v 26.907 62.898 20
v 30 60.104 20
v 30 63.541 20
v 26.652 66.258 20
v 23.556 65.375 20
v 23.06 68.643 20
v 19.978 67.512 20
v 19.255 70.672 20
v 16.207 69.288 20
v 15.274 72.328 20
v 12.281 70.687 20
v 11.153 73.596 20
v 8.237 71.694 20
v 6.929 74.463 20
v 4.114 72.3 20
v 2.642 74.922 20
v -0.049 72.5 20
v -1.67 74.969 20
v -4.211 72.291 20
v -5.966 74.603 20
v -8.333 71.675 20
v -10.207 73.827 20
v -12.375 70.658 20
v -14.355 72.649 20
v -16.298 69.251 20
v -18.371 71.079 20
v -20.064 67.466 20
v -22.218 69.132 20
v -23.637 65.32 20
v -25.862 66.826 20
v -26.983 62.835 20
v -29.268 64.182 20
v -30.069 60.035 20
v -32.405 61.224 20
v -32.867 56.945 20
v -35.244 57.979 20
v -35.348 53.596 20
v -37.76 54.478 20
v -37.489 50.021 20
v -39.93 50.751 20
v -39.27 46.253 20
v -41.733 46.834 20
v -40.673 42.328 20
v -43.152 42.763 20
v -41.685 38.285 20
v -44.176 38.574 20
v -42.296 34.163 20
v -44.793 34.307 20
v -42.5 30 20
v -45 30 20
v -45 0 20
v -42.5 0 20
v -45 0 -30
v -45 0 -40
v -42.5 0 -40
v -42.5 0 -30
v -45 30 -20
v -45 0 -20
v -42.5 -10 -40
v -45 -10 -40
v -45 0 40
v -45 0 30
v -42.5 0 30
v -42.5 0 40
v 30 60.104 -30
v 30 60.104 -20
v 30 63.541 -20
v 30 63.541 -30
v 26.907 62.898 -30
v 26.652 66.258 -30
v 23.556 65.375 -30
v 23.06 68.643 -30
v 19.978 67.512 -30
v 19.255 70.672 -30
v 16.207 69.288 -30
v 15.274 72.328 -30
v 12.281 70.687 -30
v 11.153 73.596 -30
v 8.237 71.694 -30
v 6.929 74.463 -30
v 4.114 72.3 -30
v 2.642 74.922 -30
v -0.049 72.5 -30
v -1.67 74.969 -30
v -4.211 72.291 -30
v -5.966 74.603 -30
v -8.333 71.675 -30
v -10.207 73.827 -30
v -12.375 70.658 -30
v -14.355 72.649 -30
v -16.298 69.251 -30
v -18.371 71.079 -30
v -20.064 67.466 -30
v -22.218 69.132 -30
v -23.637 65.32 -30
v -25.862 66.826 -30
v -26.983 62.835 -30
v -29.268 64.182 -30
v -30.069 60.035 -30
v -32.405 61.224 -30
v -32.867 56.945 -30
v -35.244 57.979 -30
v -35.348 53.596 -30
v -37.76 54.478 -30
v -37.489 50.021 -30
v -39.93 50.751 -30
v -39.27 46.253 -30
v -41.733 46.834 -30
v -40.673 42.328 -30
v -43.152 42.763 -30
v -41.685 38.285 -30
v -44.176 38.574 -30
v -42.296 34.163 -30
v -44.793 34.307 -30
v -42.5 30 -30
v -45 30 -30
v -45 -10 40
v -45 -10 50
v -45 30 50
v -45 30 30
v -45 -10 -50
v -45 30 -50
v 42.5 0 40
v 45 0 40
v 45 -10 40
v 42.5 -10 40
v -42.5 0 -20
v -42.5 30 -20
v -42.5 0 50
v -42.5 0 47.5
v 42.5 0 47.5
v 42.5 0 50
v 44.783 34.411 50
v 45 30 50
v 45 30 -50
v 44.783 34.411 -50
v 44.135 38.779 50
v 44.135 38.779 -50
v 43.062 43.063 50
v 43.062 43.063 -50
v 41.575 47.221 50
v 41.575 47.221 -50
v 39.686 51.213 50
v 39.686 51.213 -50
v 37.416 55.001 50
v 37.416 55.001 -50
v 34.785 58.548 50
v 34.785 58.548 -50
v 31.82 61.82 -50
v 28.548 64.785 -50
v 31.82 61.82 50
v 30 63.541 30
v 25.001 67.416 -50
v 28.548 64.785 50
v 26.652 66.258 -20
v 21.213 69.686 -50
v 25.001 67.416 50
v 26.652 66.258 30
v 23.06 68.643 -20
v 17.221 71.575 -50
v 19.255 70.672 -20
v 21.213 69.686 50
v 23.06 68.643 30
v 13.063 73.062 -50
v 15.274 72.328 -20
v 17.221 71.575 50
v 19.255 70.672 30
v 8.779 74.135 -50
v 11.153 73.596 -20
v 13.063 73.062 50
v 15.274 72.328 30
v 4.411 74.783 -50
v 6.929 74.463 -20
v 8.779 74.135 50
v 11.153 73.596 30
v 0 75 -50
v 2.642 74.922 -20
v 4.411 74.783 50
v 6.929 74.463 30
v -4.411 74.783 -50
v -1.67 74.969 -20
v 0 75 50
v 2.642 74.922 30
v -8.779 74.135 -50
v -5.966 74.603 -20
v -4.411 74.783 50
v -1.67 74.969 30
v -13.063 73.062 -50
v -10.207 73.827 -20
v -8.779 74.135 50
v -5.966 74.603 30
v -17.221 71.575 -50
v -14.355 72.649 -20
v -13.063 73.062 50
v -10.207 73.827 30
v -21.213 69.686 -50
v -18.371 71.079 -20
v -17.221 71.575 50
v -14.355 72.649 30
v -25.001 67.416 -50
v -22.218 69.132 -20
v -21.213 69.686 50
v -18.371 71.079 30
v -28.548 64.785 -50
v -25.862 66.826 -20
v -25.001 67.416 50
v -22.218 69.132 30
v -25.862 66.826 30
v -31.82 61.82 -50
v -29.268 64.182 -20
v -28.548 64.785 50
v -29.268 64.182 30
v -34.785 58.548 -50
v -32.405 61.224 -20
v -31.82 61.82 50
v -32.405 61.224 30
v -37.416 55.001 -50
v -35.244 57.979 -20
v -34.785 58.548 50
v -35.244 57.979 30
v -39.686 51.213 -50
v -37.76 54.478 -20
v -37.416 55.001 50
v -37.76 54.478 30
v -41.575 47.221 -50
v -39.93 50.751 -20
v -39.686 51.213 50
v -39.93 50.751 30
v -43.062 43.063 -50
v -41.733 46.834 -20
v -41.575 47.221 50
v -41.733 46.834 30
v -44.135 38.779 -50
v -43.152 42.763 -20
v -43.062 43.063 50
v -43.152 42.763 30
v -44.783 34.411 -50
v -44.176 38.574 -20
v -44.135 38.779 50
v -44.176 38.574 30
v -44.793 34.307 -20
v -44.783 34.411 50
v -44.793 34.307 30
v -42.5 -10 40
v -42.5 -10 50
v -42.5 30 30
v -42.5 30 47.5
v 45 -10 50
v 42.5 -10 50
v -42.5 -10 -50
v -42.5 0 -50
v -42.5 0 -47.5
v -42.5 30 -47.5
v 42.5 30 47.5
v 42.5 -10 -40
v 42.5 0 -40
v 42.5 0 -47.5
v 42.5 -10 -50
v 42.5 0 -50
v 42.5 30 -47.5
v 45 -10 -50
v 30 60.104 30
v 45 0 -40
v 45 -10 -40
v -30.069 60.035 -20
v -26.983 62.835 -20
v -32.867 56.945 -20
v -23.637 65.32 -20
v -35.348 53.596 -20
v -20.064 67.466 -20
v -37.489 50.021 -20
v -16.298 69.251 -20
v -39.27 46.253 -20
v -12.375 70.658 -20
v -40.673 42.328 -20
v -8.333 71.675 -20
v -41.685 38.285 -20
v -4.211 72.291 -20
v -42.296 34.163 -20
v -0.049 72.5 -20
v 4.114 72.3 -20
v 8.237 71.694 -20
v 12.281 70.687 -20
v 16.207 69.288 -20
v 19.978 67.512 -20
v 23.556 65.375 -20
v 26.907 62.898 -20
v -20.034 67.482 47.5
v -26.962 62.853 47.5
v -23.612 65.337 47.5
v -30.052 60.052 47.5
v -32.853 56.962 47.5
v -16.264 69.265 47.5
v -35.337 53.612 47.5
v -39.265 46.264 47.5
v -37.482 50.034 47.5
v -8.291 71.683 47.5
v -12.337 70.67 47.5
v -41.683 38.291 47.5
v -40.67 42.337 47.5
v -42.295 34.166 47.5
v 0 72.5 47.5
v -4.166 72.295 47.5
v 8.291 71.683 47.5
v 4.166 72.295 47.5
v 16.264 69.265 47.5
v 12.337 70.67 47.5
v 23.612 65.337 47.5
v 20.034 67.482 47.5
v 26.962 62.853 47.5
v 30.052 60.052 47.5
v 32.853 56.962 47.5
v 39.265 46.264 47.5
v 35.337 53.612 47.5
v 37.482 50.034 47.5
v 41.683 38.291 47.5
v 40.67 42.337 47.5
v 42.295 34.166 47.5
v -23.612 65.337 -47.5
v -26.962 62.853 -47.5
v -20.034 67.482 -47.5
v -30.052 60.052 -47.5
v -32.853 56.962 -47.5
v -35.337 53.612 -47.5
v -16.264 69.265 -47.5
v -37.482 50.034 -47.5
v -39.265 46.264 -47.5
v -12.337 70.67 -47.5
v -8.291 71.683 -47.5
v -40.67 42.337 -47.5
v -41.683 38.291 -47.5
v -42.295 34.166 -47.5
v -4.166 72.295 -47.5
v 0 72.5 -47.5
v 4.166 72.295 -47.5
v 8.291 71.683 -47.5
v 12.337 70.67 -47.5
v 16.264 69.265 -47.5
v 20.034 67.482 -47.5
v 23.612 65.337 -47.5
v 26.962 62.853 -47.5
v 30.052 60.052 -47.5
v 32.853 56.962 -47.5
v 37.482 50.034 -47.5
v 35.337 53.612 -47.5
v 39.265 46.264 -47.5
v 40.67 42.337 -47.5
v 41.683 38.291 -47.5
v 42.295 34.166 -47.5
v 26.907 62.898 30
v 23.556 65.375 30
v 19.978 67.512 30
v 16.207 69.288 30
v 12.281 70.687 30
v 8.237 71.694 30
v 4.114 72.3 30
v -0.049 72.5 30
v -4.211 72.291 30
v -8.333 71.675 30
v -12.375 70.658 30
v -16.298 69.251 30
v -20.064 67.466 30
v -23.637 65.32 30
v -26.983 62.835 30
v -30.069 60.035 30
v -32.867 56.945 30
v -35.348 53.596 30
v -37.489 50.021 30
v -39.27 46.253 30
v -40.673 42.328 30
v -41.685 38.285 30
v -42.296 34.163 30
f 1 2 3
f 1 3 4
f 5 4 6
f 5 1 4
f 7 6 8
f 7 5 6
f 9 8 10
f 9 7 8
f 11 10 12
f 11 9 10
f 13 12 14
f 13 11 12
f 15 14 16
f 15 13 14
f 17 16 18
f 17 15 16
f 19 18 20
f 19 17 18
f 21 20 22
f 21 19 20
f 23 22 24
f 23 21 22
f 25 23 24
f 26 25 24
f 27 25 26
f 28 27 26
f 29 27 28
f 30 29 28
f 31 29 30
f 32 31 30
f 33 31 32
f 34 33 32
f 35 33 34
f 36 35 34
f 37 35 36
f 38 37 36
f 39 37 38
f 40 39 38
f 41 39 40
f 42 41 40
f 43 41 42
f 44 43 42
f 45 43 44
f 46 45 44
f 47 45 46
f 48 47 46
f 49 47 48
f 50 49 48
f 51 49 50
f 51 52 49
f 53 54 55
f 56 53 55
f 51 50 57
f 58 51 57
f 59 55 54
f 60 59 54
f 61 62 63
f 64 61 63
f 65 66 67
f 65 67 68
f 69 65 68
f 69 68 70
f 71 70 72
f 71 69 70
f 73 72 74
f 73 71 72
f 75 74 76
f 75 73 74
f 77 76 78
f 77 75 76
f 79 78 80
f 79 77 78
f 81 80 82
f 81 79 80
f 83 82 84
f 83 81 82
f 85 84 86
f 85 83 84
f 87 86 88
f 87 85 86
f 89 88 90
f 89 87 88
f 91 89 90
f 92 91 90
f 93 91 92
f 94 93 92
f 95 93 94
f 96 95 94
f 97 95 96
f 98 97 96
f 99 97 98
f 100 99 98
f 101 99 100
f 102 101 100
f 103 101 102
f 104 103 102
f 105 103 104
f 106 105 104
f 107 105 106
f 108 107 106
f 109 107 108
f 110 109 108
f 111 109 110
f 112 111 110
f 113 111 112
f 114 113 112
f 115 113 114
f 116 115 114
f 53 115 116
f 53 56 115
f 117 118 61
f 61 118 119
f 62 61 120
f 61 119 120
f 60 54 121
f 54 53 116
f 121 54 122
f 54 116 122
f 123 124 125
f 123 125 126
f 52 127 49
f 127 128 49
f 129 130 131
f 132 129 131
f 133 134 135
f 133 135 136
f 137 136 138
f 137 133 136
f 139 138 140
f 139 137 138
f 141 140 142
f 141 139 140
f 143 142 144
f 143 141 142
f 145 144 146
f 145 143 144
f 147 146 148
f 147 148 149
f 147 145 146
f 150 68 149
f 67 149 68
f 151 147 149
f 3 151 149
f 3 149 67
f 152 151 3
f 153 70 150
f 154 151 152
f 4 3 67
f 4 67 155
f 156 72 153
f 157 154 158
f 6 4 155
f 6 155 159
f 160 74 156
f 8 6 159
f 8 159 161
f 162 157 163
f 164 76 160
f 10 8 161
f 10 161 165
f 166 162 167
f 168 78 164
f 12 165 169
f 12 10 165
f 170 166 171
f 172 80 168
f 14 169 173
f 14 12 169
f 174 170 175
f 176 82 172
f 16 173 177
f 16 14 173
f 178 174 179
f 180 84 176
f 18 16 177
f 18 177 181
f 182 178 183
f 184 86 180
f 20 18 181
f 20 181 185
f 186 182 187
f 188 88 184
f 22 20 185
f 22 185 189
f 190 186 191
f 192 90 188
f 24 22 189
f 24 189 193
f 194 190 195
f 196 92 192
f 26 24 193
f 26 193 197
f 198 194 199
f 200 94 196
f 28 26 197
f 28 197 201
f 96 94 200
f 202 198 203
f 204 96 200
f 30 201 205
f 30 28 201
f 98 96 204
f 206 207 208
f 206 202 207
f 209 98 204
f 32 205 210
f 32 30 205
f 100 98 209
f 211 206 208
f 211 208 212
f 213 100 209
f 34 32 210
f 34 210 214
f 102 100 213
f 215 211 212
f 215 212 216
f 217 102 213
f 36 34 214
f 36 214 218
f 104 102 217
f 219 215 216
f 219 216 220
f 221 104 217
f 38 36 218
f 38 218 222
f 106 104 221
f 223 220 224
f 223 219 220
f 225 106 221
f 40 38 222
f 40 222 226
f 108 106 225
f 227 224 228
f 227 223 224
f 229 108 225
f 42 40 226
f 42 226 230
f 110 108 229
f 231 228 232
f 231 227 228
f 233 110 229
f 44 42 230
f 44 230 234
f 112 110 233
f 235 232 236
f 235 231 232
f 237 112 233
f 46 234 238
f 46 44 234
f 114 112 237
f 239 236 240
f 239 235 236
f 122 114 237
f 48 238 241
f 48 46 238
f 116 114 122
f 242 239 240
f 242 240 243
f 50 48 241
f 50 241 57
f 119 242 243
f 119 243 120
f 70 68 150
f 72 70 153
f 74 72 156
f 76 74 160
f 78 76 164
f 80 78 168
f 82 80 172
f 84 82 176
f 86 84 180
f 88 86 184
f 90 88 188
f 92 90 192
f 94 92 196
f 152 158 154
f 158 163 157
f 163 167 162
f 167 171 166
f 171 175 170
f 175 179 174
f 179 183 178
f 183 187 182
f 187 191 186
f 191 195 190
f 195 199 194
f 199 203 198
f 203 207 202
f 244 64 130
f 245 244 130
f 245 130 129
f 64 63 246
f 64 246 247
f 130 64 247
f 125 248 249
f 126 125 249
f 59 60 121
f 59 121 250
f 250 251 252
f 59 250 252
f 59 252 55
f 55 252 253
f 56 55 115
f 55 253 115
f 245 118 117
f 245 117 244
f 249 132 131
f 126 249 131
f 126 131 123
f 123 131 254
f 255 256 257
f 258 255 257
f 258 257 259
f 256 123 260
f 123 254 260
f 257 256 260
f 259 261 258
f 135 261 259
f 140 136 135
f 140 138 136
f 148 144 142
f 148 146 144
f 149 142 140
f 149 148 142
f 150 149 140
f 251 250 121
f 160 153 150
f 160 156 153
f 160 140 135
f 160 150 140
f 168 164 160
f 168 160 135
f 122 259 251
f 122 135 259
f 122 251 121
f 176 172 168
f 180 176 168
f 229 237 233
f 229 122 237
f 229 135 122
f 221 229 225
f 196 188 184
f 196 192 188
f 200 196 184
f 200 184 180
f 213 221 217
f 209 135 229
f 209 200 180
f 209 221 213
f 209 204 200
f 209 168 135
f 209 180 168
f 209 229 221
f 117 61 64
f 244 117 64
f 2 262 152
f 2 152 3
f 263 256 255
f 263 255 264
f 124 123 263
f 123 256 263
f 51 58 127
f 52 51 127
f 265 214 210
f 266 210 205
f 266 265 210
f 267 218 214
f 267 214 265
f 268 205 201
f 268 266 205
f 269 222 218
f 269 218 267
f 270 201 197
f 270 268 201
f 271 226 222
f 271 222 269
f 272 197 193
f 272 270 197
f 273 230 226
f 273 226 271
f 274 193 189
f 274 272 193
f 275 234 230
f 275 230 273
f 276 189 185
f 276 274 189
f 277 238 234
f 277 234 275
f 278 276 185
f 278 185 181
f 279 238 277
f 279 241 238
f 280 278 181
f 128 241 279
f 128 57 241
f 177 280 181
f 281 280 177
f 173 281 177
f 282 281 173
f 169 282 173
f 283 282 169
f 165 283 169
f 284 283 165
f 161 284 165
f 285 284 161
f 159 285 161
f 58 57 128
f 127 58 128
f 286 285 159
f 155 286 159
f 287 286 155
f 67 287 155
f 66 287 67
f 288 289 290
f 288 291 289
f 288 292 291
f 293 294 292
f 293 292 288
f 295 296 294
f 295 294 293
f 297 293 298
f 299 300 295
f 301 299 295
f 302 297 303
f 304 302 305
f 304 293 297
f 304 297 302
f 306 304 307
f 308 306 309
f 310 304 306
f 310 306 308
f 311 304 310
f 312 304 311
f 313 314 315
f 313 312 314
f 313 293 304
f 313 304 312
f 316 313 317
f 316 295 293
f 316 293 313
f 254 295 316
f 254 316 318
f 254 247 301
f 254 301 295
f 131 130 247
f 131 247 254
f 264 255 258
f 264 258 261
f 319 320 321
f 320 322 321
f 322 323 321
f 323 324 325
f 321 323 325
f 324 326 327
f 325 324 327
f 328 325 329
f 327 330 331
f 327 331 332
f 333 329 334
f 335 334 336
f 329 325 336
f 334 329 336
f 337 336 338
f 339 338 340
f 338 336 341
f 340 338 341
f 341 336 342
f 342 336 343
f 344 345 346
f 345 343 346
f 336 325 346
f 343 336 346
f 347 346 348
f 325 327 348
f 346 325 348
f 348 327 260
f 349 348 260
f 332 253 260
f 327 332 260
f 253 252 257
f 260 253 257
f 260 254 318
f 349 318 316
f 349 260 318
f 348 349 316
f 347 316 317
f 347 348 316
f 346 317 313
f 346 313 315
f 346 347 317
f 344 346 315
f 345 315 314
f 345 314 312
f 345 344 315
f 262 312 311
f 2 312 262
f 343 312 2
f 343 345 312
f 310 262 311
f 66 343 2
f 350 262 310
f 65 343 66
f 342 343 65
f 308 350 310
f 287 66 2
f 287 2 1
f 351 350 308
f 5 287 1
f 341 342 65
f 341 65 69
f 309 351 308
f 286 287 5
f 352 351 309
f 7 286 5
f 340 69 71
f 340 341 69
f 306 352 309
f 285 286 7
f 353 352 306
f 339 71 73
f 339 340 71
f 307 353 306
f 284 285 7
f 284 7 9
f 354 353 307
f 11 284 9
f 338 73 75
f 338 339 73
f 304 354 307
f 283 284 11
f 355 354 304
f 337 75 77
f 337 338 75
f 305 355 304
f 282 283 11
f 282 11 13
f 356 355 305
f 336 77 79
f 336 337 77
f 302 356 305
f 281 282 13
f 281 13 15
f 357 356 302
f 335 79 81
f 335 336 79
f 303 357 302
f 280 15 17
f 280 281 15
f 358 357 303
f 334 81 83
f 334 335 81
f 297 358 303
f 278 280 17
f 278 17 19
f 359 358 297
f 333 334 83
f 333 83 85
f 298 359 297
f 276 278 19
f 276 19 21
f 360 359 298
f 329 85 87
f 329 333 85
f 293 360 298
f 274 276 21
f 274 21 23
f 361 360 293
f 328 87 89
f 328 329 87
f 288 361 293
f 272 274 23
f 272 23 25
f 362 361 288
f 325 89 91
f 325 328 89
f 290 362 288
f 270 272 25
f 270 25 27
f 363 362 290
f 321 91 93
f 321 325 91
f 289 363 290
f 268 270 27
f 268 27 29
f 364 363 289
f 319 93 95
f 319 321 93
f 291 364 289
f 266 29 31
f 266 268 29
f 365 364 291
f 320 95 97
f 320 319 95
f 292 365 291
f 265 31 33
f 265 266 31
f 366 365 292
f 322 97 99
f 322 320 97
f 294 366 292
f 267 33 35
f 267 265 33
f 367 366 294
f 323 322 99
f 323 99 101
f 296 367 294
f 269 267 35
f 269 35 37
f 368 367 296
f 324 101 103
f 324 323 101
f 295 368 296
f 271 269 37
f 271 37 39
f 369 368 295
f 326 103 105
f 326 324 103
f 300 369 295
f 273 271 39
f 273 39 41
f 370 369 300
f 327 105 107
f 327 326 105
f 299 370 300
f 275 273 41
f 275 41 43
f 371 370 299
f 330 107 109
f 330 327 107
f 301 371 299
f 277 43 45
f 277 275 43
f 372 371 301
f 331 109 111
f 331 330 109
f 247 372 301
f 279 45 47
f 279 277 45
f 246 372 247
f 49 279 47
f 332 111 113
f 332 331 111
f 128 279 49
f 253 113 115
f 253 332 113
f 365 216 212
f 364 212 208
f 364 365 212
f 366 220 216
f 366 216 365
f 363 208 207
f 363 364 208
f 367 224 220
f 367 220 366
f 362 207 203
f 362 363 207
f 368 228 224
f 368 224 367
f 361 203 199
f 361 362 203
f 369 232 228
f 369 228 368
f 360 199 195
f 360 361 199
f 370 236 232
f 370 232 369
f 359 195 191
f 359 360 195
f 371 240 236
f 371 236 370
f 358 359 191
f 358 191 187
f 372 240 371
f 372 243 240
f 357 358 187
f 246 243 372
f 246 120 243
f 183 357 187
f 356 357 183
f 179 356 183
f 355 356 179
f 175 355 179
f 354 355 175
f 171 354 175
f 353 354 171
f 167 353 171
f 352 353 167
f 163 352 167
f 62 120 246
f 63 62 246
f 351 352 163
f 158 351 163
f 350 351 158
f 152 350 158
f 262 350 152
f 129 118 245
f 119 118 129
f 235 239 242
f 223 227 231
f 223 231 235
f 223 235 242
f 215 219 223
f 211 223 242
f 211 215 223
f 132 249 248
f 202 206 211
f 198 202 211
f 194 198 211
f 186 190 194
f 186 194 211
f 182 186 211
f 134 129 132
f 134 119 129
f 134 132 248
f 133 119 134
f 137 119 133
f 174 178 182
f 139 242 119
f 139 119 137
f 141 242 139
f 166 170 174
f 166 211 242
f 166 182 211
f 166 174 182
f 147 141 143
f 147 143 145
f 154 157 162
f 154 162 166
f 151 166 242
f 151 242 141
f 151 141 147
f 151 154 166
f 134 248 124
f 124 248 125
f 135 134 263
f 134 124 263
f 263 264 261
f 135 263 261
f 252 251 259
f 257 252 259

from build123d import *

# Parameters (mm, degrees)
SKETCH1_W           = 90
SKETCH1_H           = 100
SKETCH1_W_2         = 85
SKETCH1_H_2         = 95
BOSS_EXTRUDE1_DEPTH = 30
SKETCH2_W           = 2.5
SKETCH2_H           = 10
BOSS_EXTRUDE2_DEPTH = 10
REVOLVE1_ANGLE      = 180
CUT_EXTRUDE1_DEPTH  = 76


with BuildPart() as part:
    # Sketch1 → Boss-Extrude1 (new body)
    with BuildSketch(Plane(origin=(0, 0, 0), x_dir=(1, 0, 0), z_dir=(0, 1, 0))):
        Rectangle(SKETCH1_W, SKETCH1_H)
        Rectangle(SKETCH1_W_2, SKETCH1_H_2, mode=Mode.SUBTRACT)
    extrude(amount=BOSS_EXTRUDE1_DEPTH)

    # Sketch2 → Boss-Extrude2 (add)
    with BuildSketch(Plane.XZ):
        Polygon((-42.5, 47.5), (-42.5, 50), (-45, 50), (-45, 40), (-42.5, 40), align=None)
        Polygon((42.5, 47.5), (42.5, 50), (45, 50), (45, 40), (42.5, 40), align=None)
        Polygon((-42.5, -47.5), (-42.5, -40), (-45, -40), (-45, -50), (-42.5, -50), align=None)
        with Locations((43.75, -45)):
            Rectangle(SKETCH2_W, SKETCH2_H)
    extrude(amount=BOSS_EXTRUDE2_DEPTH)

    # Sketch4 → Revolve1 (revolve)
    with BuildSketch(Plane(origin=(0, 30, 0), x_dir=(1, 0, 0), z_dir=(0, 1, 0))):
        Polygon((45, 50), (45, -50), (0, -50), (0, -47.5), (42.5, -47.5), (42.5, 47.5), (0, 47.5), (0, 50), align=None)
    revolve(axis=Axis((0, 30, -57.663927553), (0, 0, 1)), revolution_arc=REVOLVE1_ANGLE)

    # Sketch5 → Cut-Extrude1 (cut, through all)
    with BuildSketch(Plane(origin=(0, 0, 0), x_dir=(1, 0, 0), z_dir=(0, 1, 0))):
        Polygon((30, 30), (-90, 30), (-90, -30), (30, -30), (30, -20), (-80, -20), (-80, -10), (-80, 10), (-80, 20), (30, 20), align=None)
    extrude(amount=CUT_EXTRUDE1_DEPTH, mode=Mode.SUBTRACT)


solid = part.part
